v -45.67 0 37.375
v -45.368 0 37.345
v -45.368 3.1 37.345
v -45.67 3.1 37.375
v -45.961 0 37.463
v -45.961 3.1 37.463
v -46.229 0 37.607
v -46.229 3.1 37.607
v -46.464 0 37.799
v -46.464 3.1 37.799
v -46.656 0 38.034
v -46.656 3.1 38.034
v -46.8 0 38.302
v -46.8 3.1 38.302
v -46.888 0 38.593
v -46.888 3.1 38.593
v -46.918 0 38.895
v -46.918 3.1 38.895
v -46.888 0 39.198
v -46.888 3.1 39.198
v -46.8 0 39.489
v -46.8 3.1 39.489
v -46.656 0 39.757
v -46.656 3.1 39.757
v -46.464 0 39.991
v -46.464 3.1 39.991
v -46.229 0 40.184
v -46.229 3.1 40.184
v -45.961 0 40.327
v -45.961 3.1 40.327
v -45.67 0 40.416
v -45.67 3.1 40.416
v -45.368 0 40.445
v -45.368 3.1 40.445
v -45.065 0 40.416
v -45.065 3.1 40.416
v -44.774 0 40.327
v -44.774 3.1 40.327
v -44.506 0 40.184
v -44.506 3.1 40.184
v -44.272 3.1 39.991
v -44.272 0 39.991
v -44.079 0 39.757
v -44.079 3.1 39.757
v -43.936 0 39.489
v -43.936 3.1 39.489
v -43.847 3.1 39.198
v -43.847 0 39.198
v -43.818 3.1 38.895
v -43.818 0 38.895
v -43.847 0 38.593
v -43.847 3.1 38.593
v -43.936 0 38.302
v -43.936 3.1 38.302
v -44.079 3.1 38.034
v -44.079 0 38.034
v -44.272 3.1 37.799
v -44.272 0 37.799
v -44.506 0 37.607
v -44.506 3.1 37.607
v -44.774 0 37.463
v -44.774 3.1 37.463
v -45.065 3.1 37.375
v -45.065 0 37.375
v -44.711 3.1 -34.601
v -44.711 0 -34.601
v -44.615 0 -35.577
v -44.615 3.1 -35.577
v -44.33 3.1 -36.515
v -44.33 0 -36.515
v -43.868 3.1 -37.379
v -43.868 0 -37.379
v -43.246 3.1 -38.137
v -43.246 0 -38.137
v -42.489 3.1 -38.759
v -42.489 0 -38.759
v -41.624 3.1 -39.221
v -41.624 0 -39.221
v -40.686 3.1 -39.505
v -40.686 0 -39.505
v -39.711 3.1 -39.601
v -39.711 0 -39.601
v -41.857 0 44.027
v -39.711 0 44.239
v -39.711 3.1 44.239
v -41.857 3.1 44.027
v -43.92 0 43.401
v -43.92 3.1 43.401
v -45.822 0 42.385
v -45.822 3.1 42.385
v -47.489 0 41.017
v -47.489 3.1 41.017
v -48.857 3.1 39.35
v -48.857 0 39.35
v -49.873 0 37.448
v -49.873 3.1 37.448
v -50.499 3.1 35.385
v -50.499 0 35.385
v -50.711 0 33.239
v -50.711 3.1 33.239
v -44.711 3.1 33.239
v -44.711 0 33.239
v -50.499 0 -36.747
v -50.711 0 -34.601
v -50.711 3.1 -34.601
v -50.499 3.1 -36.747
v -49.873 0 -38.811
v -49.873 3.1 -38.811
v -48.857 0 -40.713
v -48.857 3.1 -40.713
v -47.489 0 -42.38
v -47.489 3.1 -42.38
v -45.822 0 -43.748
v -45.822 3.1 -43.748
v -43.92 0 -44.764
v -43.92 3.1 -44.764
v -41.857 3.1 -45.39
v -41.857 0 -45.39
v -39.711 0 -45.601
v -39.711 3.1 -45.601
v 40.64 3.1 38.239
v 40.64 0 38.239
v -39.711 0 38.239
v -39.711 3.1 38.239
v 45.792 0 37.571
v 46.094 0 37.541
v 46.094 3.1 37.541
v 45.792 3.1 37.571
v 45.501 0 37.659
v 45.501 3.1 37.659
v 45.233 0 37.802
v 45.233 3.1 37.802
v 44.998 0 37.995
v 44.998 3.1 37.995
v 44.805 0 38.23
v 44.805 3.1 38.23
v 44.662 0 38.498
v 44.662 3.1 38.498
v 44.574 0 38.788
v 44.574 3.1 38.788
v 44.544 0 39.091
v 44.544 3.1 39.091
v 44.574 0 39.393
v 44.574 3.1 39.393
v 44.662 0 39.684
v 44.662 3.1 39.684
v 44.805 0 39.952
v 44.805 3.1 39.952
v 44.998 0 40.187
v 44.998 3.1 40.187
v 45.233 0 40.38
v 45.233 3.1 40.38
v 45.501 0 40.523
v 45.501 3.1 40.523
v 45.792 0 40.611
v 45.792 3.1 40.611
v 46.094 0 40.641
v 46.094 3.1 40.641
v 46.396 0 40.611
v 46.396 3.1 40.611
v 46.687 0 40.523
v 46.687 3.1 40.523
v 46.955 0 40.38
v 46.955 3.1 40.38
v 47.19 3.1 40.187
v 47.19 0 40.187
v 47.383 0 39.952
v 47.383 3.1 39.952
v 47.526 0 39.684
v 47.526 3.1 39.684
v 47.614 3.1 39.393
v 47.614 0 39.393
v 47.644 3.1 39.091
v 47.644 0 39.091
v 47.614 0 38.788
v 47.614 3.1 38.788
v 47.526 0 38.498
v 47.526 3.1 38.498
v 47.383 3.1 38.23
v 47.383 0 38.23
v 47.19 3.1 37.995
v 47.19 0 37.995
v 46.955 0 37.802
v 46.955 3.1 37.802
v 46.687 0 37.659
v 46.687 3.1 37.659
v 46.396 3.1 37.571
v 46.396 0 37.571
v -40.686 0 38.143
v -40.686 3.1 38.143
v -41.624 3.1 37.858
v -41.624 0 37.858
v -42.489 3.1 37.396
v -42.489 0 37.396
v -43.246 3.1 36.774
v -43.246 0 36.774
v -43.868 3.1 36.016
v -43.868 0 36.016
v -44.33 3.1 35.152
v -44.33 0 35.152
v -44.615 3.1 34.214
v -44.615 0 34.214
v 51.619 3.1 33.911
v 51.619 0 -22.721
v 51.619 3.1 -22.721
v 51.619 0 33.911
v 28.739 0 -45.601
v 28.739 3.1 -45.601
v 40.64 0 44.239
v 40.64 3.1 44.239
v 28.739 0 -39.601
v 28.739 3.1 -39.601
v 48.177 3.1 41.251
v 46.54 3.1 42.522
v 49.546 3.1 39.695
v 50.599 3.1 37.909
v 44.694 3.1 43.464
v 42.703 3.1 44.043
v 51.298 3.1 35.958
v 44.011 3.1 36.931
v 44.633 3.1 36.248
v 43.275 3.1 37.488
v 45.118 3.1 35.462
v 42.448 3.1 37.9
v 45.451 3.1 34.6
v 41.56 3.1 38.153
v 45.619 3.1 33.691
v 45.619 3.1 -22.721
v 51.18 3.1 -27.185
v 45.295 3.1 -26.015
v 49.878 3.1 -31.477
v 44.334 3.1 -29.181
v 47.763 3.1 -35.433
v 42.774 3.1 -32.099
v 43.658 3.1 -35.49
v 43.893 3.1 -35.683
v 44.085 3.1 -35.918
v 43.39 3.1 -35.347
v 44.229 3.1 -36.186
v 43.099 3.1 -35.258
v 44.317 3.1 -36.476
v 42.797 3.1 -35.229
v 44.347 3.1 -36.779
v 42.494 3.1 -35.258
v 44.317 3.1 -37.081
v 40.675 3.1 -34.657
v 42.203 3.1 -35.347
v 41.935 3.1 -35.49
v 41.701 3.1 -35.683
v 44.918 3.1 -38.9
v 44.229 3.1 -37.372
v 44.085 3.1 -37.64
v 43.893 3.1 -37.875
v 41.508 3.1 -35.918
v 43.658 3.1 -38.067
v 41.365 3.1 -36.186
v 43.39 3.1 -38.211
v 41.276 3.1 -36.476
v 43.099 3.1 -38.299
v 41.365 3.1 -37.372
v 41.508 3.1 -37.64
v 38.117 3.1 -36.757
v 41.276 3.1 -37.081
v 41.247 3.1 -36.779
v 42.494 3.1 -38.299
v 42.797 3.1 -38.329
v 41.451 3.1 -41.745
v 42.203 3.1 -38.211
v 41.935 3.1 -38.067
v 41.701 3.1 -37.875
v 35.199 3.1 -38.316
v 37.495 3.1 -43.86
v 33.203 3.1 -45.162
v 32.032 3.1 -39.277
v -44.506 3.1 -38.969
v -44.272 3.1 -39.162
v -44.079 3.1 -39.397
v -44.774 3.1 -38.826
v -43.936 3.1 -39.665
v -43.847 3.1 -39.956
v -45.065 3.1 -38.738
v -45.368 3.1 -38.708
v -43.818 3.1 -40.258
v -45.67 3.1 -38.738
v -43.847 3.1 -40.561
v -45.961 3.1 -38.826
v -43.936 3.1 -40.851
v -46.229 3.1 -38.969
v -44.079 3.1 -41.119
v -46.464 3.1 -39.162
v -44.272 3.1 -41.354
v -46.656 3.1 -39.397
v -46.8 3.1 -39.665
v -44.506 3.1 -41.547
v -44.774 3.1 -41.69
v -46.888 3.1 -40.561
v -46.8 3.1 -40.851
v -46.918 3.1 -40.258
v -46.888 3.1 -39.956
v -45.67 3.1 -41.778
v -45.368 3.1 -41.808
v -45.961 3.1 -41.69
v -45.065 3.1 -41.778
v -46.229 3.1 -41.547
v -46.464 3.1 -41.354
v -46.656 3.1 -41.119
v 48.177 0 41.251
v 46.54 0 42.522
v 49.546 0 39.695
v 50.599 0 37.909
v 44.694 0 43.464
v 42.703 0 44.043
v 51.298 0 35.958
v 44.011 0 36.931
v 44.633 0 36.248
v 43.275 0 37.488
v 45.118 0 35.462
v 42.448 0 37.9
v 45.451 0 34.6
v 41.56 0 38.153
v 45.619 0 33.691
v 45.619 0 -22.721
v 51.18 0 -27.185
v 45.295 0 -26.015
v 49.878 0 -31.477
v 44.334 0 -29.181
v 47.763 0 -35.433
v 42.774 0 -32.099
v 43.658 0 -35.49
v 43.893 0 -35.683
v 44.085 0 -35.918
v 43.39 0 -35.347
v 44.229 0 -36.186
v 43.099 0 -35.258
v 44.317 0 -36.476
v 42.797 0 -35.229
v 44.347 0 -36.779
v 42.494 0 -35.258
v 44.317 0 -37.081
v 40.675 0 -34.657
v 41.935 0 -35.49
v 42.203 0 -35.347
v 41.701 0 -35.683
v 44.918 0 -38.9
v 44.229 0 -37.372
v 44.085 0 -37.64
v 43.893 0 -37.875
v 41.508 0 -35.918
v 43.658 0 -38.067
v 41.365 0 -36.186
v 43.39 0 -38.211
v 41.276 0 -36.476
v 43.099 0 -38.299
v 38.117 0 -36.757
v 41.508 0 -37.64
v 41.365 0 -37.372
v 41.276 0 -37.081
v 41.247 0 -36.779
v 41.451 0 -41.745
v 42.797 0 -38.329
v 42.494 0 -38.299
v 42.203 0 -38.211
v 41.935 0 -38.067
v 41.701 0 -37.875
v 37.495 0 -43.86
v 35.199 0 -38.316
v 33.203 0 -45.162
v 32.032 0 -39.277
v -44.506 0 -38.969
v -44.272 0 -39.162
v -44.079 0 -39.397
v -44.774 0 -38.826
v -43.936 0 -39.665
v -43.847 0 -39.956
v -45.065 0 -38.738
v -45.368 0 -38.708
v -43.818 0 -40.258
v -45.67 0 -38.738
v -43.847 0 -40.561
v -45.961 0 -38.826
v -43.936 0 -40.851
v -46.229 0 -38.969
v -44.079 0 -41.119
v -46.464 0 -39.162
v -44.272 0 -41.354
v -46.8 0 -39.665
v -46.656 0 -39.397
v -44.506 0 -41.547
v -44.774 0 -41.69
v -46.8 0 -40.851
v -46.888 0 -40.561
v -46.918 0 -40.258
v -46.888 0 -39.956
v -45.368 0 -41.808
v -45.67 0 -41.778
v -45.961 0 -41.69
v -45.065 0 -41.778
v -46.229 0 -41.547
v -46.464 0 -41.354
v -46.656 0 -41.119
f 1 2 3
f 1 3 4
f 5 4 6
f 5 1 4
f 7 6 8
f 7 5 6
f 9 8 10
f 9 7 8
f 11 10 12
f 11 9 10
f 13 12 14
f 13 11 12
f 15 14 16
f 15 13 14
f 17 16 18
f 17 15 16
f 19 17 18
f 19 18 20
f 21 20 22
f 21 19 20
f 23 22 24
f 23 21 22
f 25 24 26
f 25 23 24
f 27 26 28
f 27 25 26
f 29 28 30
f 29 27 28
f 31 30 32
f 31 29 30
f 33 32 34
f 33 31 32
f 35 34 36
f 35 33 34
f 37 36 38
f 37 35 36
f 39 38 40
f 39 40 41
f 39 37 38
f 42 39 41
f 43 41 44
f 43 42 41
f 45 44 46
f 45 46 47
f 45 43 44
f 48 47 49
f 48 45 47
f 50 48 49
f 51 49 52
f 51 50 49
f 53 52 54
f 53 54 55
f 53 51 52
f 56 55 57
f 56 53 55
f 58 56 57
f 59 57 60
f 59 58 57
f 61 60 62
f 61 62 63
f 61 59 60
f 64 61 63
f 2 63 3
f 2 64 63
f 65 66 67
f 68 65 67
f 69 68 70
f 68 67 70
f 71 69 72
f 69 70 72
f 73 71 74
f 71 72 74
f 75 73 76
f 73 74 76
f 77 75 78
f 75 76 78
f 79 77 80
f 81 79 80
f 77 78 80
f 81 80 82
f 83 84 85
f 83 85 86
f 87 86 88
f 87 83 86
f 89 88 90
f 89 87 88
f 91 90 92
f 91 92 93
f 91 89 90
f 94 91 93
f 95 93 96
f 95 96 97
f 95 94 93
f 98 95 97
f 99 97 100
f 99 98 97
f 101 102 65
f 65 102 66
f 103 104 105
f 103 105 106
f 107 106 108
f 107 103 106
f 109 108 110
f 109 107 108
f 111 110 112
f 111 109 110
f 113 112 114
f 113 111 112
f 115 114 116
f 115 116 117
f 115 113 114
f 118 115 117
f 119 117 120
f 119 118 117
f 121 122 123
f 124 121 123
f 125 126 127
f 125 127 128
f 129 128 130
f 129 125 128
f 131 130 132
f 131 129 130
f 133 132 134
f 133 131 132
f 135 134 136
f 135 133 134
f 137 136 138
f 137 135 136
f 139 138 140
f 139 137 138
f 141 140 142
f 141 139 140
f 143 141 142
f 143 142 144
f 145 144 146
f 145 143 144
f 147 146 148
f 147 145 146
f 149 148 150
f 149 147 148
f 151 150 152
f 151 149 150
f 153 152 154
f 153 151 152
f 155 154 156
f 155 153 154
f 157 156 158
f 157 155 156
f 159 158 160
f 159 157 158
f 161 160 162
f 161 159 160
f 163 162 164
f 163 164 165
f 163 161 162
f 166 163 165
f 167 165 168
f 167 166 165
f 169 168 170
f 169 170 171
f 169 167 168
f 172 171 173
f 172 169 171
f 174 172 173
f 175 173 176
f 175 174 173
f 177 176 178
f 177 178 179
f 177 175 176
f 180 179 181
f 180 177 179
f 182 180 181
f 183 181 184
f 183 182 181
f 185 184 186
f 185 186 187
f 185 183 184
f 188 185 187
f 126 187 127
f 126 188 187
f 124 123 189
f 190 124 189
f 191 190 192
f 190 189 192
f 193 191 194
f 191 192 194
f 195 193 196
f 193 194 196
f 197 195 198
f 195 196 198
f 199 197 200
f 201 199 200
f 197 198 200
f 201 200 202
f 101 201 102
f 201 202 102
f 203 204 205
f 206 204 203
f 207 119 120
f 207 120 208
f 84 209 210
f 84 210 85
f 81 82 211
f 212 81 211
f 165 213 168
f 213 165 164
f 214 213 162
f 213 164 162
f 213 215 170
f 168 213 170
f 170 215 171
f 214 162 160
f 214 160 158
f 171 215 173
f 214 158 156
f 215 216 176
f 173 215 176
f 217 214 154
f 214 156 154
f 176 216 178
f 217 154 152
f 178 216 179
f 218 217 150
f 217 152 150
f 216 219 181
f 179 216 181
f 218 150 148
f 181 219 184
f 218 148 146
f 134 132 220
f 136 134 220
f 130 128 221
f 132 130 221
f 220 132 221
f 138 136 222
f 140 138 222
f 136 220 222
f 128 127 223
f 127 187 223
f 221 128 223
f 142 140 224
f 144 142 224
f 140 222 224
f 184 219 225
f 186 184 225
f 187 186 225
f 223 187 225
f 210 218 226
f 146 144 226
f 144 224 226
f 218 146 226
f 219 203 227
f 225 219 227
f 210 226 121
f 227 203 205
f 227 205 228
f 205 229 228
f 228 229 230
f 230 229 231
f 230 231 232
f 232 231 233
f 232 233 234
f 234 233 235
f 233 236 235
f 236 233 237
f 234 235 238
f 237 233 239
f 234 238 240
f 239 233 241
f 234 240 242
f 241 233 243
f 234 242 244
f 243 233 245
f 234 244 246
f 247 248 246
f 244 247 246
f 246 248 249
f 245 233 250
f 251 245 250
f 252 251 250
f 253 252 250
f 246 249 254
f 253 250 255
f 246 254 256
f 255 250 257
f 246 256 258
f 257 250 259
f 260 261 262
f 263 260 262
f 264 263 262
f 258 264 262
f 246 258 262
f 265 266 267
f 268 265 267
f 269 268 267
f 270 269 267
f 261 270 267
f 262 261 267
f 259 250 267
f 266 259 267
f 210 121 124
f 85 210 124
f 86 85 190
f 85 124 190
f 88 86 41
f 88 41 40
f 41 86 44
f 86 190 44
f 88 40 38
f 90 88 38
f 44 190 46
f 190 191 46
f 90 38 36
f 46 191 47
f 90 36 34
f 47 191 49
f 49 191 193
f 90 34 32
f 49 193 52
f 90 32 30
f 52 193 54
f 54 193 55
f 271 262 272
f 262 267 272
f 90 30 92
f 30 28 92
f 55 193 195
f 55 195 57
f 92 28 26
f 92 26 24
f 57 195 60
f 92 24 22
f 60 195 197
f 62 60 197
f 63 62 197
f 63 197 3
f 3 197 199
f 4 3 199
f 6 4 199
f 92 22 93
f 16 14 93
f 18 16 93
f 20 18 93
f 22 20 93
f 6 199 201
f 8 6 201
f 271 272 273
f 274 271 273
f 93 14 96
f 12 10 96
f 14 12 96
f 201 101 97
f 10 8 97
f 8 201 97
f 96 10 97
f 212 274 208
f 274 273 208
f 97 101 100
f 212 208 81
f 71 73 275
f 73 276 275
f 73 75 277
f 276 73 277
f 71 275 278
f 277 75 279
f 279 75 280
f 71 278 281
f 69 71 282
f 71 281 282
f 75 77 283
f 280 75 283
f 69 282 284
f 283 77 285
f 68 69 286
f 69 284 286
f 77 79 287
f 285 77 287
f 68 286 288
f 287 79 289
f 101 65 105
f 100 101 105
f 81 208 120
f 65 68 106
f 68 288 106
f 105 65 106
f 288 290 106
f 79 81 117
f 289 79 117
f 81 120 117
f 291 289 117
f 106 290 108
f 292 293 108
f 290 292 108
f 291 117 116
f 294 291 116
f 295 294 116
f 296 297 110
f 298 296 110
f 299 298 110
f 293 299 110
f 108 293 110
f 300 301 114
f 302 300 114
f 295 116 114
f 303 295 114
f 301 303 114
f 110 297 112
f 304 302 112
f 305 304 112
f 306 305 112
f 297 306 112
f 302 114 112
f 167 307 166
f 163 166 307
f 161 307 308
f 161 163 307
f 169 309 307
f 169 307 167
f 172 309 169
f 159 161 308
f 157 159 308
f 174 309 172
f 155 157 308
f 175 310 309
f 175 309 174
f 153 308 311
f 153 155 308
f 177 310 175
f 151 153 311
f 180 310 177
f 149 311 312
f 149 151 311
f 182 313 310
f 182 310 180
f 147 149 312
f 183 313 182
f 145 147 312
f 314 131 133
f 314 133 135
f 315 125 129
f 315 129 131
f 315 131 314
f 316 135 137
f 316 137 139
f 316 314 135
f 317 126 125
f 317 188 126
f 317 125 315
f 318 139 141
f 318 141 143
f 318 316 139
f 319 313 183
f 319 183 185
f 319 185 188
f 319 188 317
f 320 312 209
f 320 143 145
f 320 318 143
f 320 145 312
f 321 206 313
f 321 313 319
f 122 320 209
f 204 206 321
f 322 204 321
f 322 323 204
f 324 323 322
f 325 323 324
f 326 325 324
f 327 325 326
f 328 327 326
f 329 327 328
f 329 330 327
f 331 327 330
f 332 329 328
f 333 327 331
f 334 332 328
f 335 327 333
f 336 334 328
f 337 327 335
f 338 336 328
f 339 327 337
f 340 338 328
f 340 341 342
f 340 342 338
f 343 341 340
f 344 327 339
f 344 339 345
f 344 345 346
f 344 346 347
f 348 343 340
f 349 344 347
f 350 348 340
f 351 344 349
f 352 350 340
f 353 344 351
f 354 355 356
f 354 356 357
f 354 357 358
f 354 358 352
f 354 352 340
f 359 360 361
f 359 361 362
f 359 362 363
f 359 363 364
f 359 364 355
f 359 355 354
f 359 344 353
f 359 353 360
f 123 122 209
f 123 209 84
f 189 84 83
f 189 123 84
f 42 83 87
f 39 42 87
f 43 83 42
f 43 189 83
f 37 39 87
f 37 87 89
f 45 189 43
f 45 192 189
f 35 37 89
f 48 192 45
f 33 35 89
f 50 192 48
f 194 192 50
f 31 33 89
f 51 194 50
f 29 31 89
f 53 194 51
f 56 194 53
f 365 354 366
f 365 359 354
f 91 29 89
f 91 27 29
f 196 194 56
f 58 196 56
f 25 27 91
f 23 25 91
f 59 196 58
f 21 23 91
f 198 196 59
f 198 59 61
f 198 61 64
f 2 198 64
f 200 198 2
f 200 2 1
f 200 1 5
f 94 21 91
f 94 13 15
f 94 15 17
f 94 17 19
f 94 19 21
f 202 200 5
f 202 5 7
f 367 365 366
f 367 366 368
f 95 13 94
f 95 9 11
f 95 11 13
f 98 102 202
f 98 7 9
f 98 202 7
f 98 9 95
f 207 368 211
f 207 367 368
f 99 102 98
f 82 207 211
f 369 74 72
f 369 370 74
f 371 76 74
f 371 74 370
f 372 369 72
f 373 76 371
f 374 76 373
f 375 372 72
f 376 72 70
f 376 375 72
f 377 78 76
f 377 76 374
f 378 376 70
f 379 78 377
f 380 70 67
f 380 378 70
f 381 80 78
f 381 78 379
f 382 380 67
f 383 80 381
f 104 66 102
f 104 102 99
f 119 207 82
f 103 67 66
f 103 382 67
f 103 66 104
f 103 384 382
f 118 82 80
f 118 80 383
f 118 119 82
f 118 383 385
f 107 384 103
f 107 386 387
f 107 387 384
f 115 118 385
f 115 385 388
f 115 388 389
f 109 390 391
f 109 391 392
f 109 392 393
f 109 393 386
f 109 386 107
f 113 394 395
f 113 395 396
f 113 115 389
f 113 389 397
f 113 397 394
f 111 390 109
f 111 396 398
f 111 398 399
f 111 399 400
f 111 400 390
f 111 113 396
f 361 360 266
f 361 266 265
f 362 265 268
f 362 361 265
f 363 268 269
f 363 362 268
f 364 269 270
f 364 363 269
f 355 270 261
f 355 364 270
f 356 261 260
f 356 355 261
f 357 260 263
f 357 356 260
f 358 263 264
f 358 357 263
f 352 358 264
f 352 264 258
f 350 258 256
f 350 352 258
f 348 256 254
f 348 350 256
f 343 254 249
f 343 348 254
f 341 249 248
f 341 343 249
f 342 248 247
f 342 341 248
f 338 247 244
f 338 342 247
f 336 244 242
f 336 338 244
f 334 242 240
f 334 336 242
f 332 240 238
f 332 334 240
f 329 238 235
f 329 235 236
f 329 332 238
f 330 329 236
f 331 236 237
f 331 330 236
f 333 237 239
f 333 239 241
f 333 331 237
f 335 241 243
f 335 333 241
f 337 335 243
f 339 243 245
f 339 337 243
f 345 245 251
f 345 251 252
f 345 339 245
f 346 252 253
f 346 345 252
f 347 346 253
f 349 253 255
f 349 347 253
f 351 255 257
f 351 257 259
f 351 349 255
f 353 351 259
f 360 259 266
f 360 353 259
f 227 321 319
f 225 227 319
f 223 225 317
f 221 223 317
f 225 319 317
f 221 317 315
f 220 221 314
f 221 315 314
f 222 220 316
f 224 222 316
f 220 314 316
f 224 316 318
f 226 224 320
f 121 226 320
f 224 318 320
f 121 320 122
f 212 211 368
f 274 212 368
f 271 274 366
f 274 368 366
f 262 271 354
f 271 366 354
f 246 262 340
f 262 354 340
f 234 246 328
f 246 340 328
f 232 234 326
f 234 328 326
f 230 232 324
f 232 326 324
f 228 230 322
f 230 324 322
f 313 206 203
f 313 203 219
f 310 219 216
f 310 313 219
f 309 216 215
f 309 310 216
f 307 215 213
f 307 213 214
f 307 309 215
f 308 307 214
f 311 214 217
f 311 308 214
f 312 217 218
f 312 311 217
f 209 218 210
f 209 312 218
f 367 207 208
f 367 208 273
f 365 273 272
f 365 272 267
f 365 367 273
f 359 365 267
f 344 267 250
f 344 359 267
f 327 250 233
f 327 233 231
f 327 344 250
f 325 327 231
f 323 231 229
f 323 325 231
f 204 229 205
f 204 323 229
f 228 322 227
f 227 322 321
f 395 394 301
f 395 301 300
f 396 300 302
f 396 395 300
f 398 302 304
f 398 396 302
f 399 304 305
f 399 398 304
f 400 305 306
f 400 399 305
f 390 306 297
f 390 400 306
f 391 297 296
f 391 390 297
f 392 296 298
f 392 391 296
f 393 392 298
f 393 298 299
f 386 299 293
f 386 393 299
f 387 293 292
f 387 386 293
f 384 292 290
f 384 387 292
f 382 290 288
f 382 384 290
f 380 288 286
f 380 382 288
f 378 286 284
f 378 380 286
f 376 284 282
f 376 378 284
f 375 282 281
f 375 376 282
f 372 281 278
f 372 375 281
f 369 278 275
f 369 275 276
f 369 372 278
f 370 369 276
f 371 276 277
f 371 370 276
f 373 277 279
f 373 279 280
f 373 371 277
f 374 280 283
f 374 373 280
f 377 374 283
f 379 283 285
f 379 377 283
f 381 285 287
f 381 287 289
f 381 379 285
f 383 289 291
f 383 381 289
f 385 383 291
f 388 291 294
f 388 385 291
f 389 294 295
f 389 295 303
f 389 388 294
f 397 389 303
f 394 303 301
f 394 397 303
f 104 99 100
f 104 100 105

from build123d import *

# Parameters (mm, degrees)
SKETCH1_R           = 1.549999996
SKETCH1_R_2         = 1.549999999
SKETCH1_R_3         = 1.550000006
SKETCH1_R_4         = 1.55
BOSS_EXTRUDE1_DEPTH = 3.1


with BuildPart() as part:
    # Sketch1 → Boss-Extrude1 (new body)
    with BuildSketch(Plane(origin=(0, 0, 0), x_dir=(1, 0, 0), z_dir=(0, 1, 0))):
        with BuildLine():
            Line((-39.710740333, 45.601389456), (28.739259425, 45.601389477))
            ThreePointArc((28.739259425, 45.601389477), (44.917862489, 38.899992874), (51.619259444, 22.721389957))
            Line((51.619259444, 22.721389957), (51.619259444, -33.910608927))
            ThreePointArc((51.619259444, -33.910608927), (48.176648434, -41.250850634), (40.639804947, -44.238610519))
            Line((40.639804947, -44.238610519), (-39.710740094, -44.238610544))
            ThreePointArc((-39.710740094, -44.238610544), (-47.488914725, -41.01678516), (-50.710740163, -33.23861055))
            Line((-50.710740163, -33.23861055), (-50.710740163, 34.601389583))
            ThreePointArc((-50.710740163, 34.601389583), (-47.488914793, 42.379564056), (-39.710740333, 45.601389456))
        make_face()
        with Locations(Location((-45.367594445, 40.258243716, 0), (0, 0, 90))):
            Circle(SKETCH1_R, mode=Mode.SUBTRACT)
        with Locations(Location((-45.367594389, -38.895464809, 0), (0, 0, 90))):
            Circle(SKETCH1_R_2, mode=Mode.SUBTRACT)
        with Locations(Location((46.094048666, -39.090808696, 0), (0, 0, 90))):
            Circle(SKETCH1_R_3, mode=Mode.SUBTRACT)
        with Locations(Location((42.796542168, 36.778672508, 0), (0, 0, 90))):
            Circle(SKETCH1_R_4, mode=Mode.SUBTRACT)
        with BuildLine():
            Line((-39.710740331, 39.601389456), (28.739259427, 39.601389477))
            ThreePointArc((28.739259427, 39.601389477), (40.675221825, 34.657352163), (45.619259444, 22.721389891))
            Line((45.619259444, 22.721389891), (45.619259444, -33.691417556))
            ThreePointArc((45.619259444, -33.691417556), (44.011448898, -36.930766758), (40.639804981, -38.238610519))
            Line((40.639804981, -38.238610519), (-39.710740095, -38.238610544))
            ThreePointArc((-39.710740095, -38.238610544), (-43.246274043, -36.774144468), (-44.710740163, -33.238610539))
            Line((-44.710740163, -33.238610539), (-44.710740163, 34.601389583))
            ThreePointArc((-44.710740163, 34.601389583), (-43.246274105, 38.136923369), (-39.710740331, 39.601389456))
        make_face(mode=Mode.SUBTRACT)
    extrude(amount=BOSS_EXTRUDE1_DEPTH)


solid = part.part
